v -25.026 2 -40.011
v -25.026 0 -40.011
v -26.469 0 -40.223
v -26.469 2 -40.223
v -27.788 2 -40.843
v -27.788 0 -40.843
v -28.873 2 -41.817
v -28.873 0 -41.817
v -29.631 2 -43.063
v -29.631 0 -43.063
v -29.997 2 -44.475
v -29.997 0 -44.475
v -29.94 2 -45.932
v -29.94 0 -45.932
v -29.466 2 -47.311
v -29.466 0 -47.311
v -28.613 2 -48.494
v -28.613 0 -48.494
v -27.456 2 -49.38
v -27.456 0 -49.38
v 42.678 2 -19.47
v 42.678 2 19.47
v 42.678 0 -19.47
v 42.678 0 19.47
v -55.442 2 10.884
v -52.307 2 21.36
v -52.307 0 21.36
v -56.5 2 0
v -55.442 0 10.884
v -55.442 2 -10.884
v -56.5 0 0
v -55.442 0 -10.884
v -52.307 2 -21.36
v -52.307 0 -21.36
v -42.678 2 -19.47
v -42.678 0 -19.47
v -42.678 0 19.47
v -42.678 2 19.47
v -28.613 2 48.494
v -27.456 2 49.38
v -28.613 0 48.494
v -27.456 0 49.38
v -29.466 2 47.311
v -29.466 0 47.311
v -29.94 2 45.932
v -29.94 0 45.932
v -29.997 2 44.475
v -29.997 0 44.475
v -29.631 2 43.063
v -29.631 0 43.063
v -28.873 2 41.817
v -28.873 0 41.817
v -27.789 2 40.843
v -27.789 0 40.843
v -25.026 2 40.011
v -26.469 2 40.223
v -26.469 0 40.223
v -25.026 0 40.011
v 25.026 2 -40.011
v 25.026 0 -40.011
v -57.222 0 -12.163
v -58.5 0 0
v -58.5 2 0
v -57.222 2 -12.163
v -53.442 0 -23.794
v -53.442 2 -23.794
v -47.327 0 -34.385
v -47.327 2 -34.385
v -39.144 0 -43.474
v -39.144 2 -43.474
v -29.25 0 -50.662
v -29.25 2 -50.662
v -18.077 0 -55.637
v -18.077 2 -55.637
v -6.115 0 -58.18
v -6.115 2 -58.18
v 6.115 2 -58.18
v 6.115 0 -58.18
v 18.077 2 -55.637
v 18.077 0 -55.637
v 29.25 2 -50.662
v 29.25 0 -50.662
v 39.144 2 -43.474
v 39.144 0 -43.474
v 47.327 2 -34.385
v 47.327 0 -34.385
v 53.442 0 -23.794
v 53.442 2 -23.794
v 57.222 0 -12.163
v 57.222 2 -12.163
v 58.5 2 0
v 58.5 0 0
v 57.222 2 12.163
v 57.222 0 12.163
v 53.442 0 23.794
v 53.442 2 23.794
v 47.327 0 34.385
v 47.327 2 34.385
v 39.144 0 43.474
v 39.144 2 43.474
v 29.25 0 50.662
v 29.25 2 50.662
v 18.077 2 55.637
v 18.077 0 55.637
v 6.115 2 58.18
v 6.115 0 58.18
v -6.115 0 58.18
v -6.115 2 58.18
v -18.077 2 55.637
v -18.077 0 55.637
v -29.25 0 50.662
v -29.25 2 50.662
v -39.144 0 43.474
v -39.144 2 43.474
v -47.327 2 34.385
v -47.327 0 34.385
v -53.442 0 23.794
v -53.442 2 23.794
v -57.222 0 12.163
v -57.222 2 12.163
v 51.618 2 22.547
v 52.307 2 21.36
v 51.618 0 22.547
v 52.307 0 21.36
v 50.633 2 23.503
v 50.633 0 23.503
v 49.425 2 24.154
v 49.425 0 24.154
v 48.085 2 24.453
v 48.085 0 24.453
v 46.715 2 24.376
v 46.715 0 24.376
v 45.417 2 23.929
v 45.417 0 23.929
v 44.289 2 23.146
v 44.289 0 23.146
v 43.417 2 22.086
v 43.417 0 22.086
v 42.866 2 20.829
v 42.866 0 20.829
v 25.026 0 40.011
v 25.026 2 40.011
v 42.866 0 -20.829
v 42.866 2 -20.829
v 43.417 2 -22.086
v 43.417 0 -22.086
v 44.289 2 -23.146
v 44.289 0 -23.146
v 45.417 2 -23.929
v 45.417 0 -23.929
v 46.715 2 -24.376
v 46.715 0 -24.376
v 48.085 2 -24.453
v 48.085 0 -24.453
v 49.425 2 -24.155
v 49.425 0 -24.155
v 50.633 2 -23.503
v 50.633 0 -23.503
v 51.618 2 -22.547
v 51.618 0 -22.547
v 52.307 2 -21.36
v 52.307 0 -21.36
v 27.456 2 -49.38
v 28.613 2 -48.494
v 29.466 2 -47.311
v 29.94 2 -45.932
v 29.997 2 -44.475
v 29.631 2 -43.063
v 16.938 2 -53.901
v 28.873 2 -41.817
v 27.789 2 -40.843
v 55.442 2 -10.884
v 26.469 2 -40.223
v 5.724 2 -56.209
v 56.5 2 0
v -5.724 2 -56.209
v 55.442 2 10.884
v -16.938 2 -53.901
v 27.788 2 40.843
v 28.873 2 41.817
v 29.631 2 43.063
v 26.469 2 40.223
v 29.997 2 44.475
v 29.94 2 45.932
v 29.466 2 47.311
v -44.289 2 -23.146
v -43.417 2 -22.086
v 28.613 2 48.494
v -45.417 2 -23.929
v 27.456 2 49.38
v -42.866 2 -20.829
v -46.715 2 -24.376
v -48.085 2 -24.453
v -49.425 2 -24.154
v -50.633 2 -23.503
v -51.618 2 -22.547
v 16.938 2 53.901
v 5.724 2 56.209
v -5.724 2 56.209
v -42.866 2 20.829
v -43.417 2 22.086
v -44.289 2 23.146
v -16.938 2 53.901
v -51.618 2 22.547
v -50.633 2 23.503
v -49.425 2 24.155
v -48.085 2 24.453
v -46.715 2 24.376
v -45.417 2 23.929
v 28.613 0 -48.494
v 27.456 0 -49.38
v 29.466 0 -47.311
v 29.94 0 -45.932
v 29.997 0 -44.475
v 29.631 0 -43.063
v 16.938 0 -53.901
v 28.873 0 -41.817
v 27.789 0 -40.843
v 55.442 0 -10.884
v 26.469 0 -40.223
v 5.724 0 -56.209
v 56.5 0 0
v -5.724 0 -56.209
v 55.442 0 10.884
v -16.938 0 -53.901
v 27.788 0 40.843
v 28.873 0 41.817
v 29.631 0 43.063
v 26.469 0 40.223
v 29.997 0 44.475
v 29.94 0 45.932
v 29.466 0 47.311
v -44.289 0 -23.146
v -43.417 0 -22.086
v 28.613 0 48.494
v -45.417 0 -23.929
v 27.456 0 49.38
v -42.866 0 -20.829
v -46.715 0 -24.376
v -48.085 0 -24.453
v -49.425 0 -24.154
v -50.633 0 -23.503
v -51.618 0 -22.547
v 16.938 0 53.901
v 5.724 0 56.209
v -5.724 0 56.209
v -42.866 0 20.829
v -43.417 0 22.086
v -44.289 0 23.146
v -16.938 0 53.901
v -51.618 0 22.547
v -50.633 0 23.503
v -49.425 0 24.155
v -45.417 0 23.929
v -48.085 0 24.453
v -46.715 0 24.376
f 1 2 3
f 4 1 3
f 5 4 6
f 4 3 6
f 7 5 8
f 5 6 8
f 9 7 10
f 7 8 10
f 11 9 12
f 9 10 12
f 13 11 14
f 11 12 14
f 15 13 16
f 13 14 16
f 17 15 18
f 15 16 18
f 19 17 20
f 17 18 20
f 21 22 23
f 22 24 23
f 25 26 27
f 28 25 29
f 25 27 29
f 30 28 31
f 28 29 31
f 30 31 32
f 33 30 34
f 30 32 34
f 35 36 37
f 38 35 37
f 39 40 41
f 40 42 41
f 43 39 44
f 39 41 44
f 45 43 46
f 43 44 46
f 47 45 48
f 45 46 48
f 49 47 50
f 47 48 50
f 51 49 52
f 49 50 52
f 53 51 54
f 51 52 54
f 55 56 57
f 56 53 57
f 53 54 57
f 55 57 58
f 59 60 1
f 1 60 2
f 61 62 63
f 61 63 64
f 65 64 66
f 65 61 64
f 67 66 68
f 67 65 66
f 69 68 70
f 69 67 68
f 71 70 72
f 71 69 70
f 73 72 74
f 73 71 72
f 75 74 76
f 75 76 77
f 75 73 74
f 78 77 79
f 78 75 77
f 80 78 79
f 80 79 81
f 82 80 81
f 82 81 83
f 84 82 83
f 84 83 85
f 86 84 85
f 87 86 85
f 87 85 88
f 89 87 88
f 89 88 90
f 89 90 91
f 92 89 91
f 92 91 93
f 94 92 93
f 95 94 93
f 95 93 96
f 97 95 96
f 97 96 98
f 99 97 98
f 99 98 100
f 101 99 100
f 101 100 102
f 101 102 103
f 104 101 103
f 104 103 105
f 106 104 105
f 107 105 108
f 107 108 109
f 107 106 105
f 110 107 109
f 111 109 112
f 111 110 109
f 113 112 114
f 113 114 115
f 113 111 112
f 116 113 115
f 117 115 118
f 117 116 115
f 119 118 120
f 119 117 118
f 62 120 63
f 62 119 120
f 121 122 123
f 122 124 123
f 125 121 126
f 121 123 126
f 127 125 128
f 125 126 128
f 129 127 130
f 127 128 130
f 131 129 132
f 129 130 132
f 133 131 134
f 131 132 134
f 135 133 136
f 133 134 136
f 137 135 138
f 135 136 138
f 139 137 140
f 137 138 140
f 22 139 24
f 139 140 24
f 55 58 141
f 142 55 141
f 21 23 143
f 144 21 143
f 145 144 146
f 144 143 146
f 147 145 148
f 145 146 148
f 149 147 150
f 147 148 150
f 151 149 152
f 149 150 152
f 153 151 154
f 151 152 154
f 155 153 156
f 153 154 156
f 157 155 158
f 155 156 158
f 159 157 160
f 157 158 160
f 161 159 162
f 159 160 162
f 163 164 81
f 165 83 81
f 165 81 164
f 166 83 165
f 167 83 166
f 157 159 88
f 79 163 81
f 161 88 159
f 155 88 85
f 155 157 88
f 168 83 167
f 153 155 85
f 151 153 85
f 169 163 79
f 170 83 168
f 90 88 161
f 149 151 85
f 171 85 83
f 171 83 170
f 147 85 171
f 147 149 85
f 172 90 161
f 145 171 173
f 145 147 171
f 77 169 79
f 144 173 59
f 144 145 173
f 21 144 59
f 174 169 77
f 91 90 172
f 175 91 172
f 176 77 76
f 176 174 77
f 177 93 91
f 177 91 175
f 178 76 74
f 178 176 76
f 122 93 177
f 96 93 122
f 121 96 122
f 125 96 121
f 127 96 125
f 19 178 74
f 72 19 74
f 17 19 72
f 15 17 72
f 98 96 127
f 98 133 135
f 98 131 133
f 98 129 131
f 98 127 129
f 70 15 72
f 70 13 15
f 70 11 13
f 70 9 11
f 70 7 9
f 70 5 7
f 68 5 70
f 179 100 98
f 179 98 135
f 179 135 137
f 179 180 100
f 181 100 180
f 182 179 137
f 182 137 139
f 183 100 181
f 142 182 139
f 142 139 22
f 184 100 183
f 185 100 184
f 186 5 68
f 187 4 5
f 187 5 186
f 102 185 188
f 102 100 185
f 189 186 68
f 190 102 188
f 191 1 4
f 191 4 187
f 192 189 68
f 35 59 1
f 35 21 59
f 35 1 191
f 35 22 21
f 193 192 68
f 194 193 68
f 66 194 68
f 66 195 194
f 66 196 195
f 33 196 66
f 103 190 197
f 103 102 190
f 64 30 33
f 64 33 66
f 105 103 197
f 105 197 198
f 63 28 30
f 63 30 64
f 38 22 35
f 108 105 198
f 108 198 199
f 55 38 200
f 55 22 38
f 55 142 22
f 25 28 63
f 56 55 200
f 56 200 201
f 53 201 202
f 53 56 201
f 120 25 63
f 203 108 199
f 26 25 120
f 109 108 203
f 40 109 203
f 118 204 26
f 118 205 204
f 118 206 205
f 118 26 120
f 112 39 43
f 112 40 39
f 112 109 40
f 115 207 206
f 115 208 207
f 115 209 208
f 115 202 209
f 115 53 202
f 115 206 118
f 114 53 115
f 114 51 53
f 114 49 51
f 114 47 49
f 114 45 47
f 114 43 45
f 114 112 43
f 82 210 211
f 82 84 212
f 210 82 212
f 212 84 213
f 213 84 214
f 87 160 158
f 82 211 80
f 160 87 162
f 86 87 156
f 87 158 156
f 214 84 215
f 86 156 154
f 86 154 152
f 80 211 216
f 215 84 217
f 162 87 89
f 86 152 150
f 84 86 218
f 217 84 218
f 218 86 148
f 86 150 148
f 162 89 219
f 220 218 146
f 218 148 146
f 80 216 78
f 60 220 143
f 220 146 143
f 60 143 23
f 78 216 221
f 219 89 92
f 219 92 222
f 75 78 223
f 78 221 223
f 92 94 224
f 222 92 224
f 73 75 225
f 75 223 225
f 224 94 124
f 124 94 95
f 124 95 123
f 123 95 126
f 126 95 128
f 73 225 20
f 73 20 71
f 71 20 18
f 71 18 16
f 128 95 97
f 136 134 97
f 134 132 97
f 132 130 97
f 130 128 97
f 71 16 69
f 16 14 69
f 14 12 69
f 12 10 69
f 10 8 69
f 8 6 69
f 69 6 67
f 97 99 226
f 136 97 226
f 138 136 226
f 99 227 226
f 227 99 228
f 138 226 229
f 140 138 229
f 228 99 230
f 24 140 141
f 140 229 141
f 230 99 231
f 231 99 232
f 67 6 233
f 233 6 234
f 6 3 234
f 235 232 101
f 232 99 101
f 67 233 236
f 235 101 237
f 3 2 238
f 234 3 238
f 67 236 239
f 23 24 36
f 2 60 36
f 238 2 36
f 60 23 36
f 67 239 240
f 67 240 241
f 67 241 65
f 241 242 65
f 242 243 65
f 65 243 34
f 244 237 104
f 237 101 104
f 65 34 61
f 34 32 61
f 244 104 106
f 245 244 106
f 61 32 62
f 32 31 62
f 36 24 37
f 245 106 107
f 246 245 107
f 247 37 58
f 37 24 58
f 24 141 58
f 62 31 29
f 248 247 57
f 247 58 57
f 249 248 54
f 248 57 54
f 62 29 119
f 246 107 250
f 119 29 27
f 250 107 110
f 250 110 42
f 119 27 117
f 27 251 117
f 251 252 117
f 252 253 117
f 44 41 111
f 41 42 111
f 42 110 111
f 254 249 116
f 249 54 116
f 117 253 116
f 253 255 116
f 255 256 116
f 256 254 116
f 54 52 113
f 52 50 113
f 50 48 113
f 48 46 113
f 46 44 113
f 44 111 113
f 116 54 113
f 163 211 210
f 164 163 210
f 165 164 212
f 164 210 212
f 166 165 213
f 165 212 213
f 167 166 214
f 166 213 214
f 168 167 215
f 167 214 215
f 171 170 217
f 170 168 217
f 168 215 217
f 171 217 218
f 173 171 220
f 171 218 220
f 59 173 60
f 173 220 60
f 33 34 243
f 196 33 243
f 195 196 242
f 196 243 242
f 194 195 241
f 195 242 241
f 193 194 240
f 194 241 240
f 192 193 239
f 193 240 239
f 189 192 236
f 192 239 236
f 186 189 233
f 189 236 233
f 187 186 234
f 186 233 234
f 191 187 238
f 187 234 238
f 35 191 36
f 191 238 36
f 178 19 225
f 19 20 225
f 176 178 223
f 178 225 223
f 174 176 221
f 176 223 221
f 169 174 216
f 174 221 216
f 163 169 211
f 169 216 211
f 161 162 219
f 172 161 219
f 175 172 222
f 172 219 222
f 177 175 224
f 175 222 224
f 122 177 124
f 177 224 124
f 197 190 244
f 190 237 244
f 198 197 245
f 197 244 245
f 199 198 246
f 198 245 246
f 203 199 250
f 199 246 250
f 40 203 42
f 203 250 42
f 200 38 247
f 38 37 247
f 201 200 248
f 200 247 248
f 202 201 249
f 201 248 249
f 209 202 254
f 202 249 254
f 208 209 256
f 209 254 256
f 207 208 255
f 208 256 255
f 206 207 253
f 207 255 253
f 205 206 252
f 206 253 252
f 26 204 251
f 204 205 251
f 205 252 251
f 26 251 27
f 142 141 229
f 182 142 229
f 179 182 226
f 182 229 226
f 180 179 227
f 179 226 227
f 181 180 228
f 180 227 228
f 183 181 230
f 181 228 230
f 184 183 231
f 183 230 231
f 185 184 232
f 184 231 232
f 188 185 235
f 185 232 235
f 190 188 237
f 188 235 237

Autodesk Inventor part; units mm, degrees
ref_plane "YZ Plane" through (0, 0, 0) normal (1, 0, 0) x (0, 1, 0)
ref_plane "XZ Plane" through (0, 0, 0) normal (0, 1, 0) x (-1, 0, 0)
ref_plane "XY Plane" through (0, 0, 0) normal (0, 0, 1) x (1, 0, 0)
sketch "Эскиз1" plane through (0, 0, 0) normal (0, 1, 0) x (-1, 0, 0)
  circle A0 centre (0, 0) radius 58.5
  line L0 (40, -37.5) -> (-40, -37.5) construction
  line L1 (-40, -37.5) -> (-40, 37.5) construction
  line L2 (-40, 37.5) -> (40, 37.5) construction
  line L3 (40, 37.5) -> (40, -37.5) construction
  line L4 (40, -37.5) -> (-40, 37.5) construction
  line L5 (-40, -37.5) -> (40, 37.5) construction
  line L6 (-42.6779, -40.0106) -> (42.6779, -40.0106)
  line L7 (42.6779, -40.0106) -> (42.6779, 40.0106)
  line L8 (42.6779, 40.0106) -> (-42.6779, 40.0106)
  line L9 (-42.6779, 40.0106) -> (-42.6779, -40.0106)
  line L10 (-42.6779, -40.0106) -> (42.6779, 40.0106) construction
  line L11 (42.6779, -40.0106) -> (-42.6779, 40.0106) construction
  arc A1 (25.026, 40.0106) -> (27.4557, 49.3805) centre (25.026, 45.0106) ccw
  circle A2 centre (0, 0) radius 56.5
  arc A3 (-27.4557, 49.3805) -> (-25.026, 40.0106) centre (-25.026, 45.0106) ccw
  arc A4 (52.3069, 21.3599) -> (42.6779, 19.4696) centre (47.6779, 19.4696) ccw
  arc A5 (42.6779, -19.4696) -> (52.3069, -21.3599) centre (47.6779, -19.4696) ccw
  arc A6 (27.4557, -49.3805) -> (25.026, -40.0106) centre (25.026, -45.0106) ccw
  arc A7 (-25.026, -40.0106) -> (-27.4557, -49.3805) centre (-25.026, -45.0106) ccw
  arc A8 (-52.3069, -21.3599) -> (-42.6779, -19.4696) centre (-47.6779, -19.4696) ccw
  arc A9 (-42.6779, 19.4696) -> (-52.3069, 21.3599) centre (-47.6779, 19.4696) ccw
  dimension "d0" = 117
  dimension "d3" = 113
  dimension "d1" = 80
  dimension "d2" = 75
  dimension "d4" = 10
  dimension "d5" = 10
  dimension "d6" = 10
  dimension "d7" = 10
  dimension "d8" = 10
  dimension "d9" = 10
  dimension "d10" = 10
  dimension "d11" = 10
extrude "Выдавливание1" add sketch "Эскиз1" along normal blind 2 contours A0 L7 A2 | L8 A2 A0 | L7 A2 L8 | A0 L6 A2 | L6 A2 L7 | L9 A2 A0 | L8 A2 L9 | A2 A4 L7 | L7 A2 L6 L9 L8 | L8 A1 A2 | L9 A2 L6 | A2 A6 L6 | L7 A5 A2 | A2 A3 L8 | L9 A9 A2 | L6 A7 A2 | A2 A8 L9
properties part number "InnerCap"
